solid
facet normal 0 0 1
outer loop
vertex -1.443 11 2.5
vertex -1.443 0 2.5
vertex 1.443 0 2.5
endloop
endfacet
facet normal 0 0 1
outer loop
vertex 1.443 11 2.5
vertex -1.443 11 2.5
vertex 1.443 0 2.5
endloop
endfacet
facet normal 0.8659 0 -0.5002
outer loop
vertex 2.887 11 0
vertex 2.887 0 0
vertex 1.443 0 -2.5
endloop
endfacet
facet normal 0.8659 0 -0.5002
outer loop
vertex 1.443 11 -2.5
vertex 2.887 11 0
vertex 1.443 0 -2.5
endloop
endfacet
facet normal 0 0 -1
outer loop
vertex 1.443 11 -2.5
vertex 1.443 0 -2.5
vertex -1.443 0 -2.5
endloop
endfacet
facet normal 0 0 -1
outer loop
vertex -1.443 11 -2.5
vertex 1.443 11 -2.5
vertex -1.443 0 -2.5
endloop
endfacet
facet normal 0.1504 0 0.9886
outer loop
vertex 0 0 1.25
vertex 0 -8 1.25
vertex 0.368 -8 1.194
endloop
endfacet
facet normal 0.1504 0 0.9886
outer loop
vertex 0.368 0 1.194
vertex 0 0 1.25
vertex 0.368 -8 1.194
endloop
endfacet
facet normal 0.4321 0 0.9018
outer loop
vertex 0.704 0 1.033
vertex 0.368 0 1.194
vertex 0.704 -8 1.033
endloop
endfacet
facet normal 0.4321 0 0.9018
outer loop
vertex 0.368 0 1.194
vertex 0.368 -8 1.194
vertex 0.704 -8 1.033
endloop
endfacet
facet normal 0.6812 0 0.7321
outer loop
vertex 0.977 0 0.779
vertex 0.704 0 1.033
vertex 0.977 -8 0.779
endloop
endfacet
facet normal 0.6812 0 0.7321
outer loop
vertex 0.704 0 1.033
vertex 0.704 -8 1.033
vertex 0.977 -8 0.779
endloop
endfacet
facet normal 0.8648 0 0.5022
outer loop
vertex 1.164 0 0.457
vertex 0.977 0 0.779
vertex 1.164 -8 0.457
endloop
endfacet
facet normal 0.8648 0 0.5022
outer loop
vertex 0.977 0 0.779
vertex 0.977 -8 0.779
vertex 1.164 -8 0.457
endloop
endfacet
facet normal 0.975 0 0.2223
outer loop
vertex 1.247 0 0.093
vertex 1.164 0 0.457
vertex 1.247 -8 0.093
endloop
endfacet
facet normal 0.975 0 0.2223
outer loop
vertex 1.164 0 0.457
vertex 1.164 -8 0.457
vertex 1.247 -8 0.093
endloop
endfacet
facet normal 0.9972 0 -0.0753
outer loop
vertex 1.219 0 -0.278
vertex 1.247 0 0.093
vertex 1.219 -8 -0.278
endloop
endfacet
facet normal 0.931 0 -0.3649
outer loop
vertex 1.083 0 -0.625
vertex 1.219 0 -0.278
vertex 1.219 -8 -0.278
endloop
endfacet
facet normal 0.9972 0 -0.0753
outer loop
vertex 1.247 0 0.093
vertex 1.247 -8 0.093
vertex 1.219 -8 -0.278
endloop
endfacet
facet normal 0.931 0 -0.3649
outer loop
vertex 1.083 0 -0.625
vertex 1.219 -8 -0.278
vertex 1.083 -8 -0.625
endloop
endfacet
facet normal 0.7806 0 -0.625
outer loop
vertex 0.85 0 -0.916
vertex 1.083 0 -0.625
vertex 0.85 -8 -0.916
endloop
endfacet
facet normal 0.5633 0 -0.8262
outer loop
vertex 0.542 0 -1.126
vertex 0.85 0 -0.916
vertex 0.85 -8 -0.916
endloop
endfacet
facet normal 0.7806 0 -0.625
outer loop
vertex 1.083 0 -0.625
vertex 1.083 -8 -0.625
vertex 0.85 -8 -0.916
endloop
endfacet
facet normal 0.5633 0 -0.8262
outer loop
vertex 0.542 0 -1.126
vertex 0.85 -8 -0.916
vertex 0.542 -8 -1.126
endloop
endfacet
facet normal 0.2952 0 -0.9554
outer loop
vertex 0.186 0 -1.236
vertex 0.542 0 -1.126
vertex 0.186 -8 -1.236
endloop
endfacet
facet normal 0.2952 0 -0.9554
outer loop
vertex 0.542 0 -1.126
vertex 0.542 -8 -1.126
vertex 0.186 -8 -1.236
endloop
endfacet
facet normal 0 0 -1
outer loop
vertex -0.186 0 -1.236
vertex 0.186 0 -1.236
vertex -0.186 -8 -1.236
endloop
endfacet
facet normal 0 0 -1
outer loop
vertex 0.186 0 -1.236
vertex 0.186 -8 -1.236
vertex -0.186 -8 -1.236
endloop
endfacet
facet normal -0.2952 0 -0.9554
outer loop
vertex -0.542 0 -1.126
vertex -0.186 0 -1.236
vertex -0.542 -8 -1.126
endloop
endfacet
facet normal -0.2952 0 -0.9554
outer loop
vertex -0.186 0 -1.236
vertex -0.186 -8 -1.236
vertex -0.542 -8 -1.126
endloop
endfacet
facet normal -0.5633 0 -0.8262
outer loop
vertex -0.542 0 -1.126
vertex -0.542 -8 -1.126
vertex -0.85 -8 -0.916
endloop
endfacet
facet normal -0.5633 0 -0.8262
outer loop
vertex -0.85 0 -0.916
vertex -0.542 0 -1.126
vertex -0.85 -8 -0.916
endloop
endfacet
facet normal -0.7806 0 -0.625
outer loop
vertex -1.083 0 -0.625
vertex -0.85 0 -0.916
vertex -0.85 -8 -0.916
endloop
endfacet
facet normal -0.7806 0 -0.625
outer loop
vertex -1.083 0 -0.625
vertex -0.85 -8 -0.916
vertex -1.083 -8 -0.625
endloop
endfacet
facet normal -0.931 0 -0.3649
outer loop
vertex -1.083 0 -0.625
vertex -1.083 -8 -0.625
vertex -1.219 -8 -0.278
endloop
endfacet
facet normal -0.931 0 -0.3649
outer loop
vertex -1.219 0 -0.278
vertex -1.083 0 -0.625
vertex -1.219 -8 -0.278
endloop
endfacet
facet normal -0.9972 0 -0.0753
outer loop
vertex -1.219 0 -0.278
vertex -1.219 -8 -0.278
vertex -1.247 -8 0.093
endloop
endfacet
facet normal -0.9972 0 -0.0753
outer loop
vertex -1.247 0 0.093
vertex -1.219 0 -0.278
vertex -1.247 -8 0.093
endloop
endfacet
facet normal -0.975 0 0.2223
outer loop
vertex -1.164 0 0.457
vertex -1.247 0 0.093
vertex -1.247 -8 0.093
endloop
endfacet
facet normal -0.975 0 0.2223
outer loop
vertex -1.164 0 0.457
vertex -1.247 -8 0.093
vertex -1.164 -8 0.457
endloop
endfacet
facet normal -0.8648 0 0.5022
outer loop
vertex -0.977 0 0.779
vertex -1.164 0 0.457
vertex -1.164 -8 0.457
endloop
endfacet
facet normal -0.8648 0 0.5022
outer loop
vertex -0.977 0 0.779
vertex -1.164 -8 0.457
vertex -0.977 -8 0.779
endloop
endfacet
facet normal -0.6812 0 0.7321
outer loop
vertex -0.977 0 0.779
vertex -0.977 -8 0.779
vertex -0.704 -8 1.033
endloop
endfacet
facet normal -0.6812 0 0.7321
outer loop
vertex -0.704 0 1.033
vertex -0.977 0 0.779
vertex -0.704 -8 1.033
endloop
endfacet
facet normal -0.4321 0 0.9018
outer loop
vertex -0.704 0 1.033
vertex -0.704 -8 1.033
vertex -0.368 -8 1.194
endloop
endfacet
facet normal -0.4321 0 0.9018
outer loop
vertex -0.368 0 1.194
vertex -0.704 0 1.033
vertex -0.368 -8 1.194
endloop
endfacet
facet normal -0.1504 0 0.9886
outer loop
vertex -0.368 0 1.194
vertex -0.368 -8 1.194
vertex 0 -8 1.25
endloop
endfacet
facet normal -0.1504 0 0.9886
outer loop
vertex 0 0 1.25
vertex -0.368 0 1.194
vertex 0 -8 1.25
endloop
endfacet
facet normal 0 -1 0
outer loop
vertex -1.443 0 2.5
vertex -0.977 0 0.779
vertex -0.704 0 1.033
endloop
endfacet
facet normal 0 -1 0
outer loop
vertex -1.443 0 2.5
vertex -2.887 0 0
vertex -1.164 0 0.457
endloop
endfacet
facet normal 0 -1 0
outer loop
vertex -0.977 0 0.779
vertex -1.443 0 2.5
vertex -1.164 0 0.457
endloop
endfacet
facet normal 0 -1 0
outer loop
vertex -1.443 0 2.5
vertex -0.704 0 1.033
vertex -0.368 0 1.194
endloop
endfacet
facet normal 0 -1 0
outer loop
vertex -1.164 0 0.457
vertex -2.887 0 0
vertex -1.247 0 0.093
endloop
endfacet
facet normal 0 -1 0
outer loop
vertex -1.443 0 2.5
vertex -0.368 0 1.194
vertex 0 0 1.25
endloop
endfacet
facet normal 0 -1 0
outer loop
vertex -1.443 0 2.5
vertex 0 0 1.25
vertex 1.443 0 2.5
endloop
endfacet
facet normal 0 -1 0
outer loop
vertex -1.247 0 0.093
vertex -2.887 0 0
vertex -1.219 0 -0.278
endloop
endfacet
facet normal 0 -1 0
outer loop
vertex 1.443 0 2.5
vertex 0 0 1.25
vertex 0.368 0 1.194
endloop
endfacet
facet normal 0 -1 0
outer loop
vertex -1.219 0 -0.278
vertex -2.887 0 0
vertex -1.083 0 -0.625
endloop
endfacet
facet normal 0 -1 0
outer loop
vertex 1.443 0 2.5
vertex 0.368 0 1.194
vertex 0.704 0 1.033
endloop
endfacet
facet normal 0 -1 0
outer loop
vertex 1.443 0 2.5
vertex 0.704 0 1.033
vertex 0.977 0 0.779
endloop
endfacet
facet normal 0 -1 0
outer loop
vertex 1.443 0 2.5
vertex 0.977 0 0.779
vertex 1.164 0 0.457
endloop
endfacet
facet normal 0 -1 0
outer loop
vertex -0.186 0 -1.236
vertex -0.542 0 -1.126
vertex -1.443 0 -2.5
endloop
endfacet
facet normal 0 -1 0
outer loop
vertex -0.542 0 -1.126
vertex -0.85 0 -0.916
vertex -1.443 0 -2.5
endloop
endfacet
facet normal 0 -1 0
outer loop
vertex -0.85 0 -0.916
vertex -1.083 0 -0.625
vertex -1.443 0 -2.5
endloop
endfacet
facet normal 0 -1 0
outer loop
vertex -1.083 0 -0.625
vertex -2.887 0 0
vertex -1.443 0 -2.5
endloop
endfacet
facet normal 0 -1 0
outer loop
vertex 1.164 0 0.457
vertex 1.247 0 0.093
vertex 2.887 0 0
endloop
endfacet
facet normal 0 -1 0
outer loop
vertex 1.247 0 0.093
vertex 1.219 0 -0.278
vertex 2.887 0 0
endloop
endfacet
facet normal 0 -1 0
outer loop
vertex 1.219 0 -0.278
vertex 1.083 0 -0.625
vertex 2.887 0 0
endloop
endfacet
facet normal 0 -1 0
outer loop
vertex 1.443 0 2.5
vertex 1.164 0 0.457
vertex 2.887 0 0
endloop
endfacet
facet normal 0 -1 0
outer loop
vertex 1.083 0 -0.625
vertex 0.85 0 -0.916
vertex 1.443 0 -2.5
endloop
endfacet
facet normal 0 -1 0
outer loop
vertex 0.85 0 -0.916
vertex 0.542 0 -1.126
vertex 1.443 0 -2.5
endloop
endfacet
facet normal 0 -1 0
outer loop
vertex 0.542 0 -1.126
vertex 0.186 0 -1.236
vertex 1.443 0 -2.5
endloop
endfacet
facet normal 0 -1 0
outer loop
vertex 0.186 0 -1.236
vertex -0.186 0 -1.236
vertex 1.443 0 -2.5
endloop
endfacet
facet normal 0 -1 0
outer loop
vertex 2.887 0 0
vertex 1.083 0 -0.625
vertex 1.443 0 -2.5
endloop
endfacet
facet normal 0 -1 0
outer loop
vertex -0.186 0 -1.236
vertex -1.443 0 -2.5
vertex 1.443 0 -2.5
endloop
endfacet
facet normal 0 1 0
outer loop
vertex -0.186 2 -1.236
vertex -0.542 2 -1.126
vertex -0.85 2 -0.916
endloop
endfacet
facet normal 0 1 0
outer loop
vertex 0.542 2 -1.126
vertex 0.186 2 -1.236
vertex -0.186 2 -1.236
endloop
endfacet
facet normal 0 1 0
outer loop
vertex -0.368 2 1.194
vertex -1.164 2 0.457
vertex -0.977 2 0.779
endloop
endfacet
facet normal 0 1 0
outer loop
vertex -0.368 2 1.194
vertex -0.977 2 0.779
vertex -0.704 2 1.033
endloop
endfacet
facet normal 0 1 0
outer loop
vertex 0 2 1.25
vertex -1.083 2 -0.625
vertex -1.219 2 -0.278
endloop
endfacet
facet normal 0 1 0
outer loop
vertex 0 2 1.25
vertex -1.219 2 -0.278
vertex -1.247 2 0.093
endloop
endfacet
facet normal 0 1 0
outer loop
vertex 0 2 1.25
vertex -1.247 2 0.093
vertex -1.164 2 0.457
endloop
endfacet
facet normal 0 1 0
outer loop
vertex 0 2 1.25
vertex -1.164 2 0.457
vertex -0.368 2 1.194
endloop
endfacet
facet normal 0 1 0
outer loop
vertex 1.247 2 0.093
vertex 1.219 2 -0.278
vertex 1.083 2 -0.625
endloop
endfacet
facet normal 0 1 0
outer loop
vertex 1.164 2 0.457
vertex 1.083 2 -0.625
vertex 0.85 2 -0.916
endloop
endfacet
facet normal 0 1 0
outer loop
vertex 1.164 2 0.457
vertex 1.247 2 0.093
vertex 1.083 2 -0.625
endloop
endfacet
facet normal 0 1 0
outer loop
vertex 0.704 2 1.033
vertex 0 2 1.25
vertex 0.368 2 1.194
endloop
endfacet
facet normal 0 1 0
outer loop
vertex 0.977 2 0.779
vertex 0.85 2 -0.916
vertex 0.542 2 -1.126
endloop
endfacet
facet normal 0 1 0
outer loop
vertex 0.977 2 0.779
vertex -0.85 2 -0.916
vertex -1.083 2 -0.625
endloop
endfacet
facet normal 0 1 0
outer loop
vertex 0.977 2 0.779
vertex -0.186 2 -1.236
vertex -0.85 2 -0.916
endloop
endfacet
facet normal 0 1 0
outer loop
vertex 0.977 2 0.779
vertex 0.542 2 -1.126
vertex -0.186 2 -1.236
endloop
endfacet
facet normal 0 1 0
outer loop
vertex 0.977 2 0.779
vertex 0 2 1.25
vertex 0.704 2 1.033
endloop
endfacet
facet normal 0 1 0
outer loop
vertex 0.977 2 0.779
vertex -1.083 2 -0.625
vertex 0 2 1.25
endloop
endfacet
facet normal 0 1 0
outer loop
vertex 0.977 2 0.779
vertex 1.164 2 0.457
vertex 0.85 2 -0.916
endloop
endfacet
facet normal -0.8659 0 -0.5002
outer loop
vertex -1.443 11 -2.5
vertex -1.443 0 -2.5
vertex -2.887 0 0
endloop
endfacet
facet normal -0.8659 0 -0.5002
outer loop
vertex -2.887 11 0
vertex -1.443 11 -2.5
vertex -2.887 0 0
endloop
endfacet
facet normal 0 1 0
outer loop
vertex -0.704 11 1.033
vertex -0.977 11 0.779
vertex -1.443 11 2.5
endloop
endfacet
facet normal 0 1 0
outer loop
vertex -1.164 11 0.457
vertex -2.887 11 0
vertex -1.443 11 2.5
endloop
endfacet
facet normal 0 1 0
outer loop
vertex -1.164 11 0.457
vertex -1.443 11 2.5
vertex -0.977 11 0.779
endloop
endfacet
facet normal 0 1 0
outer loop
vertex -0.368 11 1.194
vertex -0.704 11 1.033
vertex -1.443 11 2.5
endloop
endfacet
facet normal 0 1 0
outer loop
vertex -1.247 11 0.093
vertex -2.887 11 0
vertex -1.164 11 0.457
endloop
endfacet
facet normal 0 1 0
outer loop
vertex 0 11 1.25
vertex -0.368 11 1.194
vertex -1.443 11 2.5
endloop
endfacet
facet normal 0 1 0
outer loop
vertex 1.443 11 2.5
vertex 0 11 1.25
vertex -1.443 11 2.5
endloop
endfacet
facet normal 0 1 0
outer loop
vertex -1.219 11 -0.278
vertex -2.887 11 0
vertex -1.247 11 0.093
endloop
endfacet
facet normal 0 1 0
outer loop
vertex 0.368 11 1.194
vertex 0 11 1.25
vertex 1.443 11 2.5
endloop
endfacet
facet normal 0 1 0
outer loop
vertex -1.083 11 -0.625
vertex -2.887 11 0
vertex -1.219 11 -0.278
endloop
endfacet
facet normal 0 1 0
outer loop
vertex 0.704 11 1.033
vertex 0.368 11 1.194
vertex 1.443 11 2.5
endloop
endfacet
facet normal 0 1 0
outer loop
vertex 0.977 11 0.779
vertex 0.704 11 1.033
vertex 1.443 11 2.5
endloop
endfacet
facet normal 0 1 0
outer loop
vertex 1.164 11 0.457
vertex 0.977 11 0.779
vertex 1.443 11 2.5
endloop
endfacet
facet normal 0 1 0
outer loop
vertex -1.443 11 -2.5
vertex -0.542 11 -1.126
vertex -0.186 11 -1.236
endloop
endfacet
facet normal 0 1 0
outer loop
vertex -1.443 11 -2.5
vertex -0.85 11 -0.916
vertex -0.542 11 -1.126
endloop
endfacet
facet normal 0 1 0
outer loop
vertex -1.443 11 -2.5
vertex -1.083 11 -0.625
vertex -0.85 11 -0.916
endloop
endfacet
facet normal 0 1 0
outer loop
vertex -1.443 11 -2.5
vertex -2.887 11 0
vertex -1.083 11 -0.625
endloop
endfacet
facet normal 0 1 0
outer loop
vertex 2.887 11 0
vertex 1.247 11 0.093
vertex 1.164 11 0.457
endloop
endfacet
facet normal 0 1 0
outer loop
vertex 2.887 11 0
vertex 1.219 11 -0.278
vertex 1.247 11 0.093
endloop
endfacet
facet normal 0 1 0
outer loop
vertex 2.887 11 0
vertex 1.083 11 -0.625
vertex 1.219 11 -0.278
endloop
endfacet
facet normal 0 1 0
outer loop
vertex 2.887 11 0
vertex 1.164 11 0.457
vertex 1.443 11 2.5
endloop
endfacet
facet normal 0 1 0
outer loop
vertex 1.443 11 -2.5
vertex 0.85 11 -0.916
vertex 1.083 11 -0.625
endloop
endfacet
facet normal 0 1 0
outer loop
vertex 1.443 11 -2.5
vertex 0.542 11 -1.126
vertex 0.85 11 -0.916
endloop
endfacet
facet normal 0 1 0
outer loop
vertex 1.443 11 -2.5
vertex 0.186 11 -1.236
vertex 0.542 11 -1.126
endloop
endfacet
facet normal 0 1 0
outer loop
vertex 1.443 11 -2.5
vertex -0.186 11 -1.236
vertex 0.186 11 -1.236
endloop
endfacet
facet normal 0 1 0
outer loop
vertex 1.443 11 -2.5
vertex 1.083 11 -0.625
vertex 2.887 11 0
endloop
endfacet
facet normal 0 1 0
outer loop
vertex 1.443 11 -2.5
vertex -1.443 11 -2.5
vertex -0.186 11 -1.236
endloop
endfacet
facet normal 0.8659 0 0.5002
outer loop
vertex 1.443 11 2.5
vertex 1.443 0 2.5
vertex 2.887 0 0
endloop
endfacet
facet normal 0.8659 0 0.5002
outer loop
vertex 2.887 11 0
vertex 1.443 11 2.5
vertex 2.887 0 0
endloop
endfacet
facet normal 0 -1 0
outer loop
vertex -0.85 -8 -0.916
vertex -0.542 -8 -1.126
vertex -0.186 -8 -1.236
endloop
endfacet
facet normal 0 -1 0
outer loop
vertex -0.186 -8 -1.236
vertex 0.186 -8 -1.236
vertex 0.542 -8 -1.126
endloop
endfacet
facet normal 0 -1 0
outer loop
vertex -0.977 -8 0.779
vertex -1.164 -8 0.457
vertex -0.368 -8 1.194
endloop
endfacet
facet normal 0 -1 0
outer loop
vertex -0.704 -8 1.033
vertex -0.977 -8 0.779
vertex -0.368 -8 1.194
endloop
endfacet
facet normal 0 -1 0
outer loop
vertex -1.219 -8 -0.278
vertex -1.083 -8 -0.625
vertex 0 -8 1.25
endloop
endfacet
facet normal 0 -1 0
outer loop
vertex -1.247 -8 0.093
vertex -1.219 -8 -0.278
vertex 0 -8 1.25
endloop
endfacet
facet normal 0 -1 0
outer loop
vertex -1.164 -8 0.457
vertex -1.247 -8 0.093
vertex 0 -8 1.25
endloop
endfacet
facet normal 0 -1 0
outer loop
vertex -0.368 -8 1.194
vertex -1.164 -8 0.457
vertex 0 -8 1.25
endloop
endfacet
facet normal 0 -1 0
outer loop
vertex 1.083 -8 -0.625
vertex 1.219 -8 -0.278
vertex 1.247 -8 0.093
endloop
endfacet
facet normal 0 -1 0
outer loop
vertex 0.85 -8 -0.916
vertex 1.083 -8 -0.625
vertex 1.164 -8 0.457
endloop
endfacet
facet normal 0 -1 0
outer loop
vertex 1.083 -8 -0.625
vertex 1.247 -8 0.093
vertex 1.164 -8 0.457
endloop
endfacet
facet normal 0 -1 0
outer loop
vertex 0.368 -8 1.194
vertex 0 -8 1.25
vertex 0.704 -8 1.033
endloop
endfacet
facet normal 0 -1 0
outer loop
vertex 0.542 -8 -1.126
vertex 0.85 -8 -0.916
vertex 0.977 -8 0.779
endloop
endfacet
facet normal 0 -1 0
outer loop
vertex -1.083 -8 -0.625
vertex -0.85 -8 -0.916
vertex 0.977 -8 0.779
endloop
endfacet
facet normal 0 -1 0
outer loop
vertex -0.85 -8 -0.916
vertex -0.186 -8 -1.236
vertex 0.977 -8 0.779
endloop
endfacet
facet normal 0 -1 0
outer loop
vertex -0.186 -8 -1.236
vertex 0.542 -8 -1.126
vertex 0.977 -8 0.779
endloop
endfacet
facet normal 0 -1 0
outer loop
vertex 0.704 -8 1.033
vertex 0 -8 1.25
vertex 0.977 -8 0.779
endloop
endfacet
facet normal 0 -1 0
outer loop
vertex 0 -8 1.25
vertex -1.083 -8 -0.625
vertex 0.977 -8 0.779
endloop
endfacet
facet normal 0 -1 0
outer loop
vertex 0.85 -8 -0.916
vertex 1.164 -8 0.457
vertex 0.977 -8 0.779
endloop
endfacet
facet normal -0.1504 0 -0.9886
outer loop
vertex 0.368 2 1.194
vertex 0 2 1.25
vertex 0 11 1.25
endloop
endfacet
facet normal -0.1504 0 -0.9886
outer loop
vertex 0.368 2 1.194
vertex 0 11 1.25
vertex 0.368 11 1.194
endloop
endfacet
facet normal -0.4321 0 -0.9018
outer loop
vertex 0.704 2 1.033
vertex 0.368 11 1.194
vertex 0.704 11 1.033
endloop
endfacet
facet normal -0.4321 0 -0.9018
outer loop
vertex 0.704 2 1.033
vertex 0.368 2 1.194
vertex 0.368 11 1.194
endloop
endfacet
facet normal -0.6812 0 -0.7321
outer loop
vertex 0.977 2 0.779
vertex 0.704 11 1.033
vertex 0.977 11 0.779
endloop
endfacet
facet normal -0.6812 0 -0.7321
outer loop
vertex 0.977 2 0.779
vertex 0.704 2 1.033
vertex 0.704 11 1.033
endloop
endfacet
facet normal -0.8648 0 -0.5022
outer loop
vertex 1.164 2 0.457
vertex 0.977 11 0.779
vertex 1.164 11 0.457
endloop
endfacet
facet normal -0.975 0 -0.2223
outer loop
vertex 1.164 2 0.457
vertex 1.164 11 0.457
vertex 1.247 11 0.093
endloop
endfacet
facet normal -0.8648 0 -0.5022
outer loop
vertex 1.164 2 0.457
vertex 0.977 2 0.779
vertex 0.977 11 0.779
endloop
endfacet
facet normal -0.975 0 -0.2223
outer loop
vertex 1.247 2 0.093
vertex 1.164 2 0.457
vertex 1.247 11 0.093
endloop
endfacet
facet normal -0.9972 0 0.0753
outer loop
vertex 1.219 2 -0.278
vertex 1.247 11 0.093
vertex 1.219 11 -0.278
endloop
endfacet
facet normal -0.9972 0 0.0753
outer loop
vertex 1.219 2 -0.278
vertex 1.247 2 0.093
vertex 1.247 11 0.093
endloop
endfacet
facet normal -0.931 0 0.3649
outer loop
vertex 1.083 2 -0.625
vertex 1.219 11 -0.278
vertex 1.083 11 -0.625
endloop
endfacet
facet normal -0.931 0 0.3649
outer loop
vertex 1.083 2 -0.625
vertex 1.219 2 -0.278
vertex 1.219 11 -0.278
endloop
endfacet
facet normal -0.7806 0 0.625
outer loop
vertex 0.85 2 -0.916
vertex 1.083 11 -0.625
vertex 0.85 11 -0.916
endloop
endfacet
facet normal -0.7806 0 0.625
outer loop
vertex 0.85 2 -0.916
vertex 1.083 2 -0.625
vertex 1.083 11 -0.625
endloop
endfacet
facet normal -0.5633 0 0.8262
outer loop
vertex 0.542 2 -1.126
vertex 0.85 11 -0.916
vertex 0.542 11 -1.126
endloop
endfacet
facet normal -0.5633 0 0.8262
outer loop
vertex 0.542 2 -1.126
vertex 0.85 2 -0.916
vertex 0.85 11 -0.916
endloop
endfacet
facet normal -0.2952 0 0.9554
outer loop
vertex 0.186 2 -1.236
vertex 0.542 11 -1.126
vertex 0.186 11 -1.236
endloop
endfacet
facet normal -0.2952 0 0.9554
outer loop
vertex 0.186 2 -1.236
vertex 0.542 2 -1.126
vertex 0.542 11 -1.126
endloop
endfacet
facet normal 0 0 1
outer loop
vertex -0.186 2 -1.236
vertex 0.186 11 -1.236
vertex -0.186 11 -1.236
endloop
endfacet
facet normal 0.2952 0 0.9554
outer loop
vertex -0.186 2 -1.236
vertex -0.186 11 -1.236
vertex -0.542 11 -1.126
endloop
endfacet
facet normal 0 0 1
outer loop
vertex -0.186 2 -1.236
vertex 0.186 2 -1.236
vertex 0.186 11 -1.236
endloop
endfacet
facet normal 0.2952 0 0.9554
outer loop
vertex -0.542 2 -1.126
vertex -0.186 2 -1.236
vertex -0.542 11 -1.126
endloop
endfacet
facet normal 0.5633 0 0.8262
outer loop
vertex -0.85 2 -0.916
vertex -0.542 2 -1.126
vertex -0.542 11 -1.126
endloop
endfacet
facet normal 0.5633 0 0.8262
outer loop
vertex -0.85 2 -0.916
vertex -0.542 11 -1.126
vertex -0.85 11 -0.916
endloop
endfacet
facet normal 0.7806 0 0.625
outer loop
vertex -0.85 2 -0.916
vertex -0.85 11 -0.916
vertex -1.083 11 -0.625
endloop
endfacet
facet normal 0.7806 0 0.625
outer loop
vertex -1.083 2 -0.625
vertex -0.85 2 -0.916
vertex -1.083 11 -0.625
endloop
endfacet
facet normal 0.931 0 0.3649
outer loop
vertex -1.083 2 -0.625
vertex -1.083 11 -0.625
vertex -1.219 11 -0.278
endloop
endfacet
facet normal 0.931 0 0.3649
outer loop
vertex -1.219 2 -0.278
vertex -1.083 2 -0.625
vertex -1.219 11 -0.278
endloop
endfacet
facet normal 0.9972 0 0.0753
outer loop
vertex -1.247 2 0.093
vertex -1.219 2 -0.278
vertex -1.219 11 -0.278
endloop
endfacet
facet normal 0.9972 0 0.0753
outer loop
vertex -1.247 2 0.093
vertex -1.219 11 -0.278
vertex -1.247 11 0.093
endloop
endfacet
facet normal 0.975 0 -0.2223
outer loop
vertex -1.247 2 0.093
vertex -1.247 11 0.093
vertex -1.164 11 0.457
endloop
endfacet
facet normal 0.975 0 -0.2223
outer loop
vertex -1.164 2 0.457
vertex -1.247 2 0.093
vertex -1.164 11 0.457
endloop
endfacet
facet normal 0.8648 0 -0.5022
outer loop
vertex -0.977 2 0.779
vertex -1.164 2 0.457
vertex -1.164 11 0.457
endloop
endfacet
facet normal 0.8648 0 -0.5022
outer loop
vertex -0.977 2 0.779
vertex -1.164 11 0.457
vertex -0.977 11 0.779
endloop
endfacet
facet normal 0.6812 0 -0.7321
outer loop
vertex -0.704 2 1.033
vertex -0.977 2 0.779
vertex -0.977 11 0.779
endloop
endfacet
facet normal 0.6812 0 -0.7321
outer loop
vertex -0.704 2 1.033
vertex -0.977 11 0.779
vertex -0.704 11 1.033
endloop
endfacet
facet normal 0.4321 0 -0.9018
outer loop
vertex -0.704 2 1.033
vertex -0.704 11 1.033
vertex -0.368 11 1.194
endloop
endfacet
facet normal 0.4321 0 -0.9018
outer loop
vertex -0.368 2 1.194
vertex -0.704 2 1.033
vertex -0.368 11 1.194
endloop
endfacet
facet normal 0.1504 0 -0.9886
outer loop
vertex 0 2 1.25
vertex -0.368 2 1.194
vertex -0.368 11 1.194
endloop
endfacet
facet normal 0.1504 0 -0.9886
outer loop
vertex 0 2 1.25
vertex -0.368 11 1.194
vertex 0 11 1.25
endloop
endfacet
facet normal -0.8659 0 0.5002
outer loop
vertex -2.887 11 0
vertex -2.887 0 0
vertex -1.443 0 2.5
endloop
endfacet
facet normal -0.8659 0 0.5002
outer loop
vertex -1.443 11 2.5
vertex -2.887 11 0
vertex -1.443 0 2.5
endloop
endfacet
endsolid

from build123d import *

# Parameters (mm, degrees)
SKETCH1_R                = 1.25
BOSS_EXTRUDE1_DEPTH      = 11
BOSS_EXTRUDE2_DEPTH      = 2
BOSS_EXTRUDE2_DEPTH_BACK = 8
SKETCH1_2_R              = 1.25


with BuildPart() as part:
    # Sketch1 → Boss-Extrude1 (new body)
    with BuildSketch(Plane(origin=(0, 0, 0), x_dir=(1, 0, 0), z_dir=(0, 1, 0))):
        Polygon((-2.886751346, 0), (-1.443375673, -2.5), (1.443375673, -2.5), (2.886751346, 0), (1.443375673, 2.5), (-1.443375673, 2.5), align=None)
        Circle(SKETCH1_R, mode=Mode.SUBTRACT)
    extrude(amount=BOSS_EXTRUDE1_DEPTH)

    # Sketch1<2> → Boss-Extrude2 (add, two sides: drawn at the far end of the back side and taken through both)
    with BuildSketch(Plane(origin=(0, 0, 0), x_dir=(1, 0, 0), z_dir=(0, 1, 0)).offset(-BOSS_EXTRUDE2_DEPTH_BACK)):
        Circle(SKETCH1_2_R)
    extrude(amount=BOSS_EXTRUDE2_DEPTH + BOSS_EXTRUDE2_DEPTH_BACK)


solid = part.part
